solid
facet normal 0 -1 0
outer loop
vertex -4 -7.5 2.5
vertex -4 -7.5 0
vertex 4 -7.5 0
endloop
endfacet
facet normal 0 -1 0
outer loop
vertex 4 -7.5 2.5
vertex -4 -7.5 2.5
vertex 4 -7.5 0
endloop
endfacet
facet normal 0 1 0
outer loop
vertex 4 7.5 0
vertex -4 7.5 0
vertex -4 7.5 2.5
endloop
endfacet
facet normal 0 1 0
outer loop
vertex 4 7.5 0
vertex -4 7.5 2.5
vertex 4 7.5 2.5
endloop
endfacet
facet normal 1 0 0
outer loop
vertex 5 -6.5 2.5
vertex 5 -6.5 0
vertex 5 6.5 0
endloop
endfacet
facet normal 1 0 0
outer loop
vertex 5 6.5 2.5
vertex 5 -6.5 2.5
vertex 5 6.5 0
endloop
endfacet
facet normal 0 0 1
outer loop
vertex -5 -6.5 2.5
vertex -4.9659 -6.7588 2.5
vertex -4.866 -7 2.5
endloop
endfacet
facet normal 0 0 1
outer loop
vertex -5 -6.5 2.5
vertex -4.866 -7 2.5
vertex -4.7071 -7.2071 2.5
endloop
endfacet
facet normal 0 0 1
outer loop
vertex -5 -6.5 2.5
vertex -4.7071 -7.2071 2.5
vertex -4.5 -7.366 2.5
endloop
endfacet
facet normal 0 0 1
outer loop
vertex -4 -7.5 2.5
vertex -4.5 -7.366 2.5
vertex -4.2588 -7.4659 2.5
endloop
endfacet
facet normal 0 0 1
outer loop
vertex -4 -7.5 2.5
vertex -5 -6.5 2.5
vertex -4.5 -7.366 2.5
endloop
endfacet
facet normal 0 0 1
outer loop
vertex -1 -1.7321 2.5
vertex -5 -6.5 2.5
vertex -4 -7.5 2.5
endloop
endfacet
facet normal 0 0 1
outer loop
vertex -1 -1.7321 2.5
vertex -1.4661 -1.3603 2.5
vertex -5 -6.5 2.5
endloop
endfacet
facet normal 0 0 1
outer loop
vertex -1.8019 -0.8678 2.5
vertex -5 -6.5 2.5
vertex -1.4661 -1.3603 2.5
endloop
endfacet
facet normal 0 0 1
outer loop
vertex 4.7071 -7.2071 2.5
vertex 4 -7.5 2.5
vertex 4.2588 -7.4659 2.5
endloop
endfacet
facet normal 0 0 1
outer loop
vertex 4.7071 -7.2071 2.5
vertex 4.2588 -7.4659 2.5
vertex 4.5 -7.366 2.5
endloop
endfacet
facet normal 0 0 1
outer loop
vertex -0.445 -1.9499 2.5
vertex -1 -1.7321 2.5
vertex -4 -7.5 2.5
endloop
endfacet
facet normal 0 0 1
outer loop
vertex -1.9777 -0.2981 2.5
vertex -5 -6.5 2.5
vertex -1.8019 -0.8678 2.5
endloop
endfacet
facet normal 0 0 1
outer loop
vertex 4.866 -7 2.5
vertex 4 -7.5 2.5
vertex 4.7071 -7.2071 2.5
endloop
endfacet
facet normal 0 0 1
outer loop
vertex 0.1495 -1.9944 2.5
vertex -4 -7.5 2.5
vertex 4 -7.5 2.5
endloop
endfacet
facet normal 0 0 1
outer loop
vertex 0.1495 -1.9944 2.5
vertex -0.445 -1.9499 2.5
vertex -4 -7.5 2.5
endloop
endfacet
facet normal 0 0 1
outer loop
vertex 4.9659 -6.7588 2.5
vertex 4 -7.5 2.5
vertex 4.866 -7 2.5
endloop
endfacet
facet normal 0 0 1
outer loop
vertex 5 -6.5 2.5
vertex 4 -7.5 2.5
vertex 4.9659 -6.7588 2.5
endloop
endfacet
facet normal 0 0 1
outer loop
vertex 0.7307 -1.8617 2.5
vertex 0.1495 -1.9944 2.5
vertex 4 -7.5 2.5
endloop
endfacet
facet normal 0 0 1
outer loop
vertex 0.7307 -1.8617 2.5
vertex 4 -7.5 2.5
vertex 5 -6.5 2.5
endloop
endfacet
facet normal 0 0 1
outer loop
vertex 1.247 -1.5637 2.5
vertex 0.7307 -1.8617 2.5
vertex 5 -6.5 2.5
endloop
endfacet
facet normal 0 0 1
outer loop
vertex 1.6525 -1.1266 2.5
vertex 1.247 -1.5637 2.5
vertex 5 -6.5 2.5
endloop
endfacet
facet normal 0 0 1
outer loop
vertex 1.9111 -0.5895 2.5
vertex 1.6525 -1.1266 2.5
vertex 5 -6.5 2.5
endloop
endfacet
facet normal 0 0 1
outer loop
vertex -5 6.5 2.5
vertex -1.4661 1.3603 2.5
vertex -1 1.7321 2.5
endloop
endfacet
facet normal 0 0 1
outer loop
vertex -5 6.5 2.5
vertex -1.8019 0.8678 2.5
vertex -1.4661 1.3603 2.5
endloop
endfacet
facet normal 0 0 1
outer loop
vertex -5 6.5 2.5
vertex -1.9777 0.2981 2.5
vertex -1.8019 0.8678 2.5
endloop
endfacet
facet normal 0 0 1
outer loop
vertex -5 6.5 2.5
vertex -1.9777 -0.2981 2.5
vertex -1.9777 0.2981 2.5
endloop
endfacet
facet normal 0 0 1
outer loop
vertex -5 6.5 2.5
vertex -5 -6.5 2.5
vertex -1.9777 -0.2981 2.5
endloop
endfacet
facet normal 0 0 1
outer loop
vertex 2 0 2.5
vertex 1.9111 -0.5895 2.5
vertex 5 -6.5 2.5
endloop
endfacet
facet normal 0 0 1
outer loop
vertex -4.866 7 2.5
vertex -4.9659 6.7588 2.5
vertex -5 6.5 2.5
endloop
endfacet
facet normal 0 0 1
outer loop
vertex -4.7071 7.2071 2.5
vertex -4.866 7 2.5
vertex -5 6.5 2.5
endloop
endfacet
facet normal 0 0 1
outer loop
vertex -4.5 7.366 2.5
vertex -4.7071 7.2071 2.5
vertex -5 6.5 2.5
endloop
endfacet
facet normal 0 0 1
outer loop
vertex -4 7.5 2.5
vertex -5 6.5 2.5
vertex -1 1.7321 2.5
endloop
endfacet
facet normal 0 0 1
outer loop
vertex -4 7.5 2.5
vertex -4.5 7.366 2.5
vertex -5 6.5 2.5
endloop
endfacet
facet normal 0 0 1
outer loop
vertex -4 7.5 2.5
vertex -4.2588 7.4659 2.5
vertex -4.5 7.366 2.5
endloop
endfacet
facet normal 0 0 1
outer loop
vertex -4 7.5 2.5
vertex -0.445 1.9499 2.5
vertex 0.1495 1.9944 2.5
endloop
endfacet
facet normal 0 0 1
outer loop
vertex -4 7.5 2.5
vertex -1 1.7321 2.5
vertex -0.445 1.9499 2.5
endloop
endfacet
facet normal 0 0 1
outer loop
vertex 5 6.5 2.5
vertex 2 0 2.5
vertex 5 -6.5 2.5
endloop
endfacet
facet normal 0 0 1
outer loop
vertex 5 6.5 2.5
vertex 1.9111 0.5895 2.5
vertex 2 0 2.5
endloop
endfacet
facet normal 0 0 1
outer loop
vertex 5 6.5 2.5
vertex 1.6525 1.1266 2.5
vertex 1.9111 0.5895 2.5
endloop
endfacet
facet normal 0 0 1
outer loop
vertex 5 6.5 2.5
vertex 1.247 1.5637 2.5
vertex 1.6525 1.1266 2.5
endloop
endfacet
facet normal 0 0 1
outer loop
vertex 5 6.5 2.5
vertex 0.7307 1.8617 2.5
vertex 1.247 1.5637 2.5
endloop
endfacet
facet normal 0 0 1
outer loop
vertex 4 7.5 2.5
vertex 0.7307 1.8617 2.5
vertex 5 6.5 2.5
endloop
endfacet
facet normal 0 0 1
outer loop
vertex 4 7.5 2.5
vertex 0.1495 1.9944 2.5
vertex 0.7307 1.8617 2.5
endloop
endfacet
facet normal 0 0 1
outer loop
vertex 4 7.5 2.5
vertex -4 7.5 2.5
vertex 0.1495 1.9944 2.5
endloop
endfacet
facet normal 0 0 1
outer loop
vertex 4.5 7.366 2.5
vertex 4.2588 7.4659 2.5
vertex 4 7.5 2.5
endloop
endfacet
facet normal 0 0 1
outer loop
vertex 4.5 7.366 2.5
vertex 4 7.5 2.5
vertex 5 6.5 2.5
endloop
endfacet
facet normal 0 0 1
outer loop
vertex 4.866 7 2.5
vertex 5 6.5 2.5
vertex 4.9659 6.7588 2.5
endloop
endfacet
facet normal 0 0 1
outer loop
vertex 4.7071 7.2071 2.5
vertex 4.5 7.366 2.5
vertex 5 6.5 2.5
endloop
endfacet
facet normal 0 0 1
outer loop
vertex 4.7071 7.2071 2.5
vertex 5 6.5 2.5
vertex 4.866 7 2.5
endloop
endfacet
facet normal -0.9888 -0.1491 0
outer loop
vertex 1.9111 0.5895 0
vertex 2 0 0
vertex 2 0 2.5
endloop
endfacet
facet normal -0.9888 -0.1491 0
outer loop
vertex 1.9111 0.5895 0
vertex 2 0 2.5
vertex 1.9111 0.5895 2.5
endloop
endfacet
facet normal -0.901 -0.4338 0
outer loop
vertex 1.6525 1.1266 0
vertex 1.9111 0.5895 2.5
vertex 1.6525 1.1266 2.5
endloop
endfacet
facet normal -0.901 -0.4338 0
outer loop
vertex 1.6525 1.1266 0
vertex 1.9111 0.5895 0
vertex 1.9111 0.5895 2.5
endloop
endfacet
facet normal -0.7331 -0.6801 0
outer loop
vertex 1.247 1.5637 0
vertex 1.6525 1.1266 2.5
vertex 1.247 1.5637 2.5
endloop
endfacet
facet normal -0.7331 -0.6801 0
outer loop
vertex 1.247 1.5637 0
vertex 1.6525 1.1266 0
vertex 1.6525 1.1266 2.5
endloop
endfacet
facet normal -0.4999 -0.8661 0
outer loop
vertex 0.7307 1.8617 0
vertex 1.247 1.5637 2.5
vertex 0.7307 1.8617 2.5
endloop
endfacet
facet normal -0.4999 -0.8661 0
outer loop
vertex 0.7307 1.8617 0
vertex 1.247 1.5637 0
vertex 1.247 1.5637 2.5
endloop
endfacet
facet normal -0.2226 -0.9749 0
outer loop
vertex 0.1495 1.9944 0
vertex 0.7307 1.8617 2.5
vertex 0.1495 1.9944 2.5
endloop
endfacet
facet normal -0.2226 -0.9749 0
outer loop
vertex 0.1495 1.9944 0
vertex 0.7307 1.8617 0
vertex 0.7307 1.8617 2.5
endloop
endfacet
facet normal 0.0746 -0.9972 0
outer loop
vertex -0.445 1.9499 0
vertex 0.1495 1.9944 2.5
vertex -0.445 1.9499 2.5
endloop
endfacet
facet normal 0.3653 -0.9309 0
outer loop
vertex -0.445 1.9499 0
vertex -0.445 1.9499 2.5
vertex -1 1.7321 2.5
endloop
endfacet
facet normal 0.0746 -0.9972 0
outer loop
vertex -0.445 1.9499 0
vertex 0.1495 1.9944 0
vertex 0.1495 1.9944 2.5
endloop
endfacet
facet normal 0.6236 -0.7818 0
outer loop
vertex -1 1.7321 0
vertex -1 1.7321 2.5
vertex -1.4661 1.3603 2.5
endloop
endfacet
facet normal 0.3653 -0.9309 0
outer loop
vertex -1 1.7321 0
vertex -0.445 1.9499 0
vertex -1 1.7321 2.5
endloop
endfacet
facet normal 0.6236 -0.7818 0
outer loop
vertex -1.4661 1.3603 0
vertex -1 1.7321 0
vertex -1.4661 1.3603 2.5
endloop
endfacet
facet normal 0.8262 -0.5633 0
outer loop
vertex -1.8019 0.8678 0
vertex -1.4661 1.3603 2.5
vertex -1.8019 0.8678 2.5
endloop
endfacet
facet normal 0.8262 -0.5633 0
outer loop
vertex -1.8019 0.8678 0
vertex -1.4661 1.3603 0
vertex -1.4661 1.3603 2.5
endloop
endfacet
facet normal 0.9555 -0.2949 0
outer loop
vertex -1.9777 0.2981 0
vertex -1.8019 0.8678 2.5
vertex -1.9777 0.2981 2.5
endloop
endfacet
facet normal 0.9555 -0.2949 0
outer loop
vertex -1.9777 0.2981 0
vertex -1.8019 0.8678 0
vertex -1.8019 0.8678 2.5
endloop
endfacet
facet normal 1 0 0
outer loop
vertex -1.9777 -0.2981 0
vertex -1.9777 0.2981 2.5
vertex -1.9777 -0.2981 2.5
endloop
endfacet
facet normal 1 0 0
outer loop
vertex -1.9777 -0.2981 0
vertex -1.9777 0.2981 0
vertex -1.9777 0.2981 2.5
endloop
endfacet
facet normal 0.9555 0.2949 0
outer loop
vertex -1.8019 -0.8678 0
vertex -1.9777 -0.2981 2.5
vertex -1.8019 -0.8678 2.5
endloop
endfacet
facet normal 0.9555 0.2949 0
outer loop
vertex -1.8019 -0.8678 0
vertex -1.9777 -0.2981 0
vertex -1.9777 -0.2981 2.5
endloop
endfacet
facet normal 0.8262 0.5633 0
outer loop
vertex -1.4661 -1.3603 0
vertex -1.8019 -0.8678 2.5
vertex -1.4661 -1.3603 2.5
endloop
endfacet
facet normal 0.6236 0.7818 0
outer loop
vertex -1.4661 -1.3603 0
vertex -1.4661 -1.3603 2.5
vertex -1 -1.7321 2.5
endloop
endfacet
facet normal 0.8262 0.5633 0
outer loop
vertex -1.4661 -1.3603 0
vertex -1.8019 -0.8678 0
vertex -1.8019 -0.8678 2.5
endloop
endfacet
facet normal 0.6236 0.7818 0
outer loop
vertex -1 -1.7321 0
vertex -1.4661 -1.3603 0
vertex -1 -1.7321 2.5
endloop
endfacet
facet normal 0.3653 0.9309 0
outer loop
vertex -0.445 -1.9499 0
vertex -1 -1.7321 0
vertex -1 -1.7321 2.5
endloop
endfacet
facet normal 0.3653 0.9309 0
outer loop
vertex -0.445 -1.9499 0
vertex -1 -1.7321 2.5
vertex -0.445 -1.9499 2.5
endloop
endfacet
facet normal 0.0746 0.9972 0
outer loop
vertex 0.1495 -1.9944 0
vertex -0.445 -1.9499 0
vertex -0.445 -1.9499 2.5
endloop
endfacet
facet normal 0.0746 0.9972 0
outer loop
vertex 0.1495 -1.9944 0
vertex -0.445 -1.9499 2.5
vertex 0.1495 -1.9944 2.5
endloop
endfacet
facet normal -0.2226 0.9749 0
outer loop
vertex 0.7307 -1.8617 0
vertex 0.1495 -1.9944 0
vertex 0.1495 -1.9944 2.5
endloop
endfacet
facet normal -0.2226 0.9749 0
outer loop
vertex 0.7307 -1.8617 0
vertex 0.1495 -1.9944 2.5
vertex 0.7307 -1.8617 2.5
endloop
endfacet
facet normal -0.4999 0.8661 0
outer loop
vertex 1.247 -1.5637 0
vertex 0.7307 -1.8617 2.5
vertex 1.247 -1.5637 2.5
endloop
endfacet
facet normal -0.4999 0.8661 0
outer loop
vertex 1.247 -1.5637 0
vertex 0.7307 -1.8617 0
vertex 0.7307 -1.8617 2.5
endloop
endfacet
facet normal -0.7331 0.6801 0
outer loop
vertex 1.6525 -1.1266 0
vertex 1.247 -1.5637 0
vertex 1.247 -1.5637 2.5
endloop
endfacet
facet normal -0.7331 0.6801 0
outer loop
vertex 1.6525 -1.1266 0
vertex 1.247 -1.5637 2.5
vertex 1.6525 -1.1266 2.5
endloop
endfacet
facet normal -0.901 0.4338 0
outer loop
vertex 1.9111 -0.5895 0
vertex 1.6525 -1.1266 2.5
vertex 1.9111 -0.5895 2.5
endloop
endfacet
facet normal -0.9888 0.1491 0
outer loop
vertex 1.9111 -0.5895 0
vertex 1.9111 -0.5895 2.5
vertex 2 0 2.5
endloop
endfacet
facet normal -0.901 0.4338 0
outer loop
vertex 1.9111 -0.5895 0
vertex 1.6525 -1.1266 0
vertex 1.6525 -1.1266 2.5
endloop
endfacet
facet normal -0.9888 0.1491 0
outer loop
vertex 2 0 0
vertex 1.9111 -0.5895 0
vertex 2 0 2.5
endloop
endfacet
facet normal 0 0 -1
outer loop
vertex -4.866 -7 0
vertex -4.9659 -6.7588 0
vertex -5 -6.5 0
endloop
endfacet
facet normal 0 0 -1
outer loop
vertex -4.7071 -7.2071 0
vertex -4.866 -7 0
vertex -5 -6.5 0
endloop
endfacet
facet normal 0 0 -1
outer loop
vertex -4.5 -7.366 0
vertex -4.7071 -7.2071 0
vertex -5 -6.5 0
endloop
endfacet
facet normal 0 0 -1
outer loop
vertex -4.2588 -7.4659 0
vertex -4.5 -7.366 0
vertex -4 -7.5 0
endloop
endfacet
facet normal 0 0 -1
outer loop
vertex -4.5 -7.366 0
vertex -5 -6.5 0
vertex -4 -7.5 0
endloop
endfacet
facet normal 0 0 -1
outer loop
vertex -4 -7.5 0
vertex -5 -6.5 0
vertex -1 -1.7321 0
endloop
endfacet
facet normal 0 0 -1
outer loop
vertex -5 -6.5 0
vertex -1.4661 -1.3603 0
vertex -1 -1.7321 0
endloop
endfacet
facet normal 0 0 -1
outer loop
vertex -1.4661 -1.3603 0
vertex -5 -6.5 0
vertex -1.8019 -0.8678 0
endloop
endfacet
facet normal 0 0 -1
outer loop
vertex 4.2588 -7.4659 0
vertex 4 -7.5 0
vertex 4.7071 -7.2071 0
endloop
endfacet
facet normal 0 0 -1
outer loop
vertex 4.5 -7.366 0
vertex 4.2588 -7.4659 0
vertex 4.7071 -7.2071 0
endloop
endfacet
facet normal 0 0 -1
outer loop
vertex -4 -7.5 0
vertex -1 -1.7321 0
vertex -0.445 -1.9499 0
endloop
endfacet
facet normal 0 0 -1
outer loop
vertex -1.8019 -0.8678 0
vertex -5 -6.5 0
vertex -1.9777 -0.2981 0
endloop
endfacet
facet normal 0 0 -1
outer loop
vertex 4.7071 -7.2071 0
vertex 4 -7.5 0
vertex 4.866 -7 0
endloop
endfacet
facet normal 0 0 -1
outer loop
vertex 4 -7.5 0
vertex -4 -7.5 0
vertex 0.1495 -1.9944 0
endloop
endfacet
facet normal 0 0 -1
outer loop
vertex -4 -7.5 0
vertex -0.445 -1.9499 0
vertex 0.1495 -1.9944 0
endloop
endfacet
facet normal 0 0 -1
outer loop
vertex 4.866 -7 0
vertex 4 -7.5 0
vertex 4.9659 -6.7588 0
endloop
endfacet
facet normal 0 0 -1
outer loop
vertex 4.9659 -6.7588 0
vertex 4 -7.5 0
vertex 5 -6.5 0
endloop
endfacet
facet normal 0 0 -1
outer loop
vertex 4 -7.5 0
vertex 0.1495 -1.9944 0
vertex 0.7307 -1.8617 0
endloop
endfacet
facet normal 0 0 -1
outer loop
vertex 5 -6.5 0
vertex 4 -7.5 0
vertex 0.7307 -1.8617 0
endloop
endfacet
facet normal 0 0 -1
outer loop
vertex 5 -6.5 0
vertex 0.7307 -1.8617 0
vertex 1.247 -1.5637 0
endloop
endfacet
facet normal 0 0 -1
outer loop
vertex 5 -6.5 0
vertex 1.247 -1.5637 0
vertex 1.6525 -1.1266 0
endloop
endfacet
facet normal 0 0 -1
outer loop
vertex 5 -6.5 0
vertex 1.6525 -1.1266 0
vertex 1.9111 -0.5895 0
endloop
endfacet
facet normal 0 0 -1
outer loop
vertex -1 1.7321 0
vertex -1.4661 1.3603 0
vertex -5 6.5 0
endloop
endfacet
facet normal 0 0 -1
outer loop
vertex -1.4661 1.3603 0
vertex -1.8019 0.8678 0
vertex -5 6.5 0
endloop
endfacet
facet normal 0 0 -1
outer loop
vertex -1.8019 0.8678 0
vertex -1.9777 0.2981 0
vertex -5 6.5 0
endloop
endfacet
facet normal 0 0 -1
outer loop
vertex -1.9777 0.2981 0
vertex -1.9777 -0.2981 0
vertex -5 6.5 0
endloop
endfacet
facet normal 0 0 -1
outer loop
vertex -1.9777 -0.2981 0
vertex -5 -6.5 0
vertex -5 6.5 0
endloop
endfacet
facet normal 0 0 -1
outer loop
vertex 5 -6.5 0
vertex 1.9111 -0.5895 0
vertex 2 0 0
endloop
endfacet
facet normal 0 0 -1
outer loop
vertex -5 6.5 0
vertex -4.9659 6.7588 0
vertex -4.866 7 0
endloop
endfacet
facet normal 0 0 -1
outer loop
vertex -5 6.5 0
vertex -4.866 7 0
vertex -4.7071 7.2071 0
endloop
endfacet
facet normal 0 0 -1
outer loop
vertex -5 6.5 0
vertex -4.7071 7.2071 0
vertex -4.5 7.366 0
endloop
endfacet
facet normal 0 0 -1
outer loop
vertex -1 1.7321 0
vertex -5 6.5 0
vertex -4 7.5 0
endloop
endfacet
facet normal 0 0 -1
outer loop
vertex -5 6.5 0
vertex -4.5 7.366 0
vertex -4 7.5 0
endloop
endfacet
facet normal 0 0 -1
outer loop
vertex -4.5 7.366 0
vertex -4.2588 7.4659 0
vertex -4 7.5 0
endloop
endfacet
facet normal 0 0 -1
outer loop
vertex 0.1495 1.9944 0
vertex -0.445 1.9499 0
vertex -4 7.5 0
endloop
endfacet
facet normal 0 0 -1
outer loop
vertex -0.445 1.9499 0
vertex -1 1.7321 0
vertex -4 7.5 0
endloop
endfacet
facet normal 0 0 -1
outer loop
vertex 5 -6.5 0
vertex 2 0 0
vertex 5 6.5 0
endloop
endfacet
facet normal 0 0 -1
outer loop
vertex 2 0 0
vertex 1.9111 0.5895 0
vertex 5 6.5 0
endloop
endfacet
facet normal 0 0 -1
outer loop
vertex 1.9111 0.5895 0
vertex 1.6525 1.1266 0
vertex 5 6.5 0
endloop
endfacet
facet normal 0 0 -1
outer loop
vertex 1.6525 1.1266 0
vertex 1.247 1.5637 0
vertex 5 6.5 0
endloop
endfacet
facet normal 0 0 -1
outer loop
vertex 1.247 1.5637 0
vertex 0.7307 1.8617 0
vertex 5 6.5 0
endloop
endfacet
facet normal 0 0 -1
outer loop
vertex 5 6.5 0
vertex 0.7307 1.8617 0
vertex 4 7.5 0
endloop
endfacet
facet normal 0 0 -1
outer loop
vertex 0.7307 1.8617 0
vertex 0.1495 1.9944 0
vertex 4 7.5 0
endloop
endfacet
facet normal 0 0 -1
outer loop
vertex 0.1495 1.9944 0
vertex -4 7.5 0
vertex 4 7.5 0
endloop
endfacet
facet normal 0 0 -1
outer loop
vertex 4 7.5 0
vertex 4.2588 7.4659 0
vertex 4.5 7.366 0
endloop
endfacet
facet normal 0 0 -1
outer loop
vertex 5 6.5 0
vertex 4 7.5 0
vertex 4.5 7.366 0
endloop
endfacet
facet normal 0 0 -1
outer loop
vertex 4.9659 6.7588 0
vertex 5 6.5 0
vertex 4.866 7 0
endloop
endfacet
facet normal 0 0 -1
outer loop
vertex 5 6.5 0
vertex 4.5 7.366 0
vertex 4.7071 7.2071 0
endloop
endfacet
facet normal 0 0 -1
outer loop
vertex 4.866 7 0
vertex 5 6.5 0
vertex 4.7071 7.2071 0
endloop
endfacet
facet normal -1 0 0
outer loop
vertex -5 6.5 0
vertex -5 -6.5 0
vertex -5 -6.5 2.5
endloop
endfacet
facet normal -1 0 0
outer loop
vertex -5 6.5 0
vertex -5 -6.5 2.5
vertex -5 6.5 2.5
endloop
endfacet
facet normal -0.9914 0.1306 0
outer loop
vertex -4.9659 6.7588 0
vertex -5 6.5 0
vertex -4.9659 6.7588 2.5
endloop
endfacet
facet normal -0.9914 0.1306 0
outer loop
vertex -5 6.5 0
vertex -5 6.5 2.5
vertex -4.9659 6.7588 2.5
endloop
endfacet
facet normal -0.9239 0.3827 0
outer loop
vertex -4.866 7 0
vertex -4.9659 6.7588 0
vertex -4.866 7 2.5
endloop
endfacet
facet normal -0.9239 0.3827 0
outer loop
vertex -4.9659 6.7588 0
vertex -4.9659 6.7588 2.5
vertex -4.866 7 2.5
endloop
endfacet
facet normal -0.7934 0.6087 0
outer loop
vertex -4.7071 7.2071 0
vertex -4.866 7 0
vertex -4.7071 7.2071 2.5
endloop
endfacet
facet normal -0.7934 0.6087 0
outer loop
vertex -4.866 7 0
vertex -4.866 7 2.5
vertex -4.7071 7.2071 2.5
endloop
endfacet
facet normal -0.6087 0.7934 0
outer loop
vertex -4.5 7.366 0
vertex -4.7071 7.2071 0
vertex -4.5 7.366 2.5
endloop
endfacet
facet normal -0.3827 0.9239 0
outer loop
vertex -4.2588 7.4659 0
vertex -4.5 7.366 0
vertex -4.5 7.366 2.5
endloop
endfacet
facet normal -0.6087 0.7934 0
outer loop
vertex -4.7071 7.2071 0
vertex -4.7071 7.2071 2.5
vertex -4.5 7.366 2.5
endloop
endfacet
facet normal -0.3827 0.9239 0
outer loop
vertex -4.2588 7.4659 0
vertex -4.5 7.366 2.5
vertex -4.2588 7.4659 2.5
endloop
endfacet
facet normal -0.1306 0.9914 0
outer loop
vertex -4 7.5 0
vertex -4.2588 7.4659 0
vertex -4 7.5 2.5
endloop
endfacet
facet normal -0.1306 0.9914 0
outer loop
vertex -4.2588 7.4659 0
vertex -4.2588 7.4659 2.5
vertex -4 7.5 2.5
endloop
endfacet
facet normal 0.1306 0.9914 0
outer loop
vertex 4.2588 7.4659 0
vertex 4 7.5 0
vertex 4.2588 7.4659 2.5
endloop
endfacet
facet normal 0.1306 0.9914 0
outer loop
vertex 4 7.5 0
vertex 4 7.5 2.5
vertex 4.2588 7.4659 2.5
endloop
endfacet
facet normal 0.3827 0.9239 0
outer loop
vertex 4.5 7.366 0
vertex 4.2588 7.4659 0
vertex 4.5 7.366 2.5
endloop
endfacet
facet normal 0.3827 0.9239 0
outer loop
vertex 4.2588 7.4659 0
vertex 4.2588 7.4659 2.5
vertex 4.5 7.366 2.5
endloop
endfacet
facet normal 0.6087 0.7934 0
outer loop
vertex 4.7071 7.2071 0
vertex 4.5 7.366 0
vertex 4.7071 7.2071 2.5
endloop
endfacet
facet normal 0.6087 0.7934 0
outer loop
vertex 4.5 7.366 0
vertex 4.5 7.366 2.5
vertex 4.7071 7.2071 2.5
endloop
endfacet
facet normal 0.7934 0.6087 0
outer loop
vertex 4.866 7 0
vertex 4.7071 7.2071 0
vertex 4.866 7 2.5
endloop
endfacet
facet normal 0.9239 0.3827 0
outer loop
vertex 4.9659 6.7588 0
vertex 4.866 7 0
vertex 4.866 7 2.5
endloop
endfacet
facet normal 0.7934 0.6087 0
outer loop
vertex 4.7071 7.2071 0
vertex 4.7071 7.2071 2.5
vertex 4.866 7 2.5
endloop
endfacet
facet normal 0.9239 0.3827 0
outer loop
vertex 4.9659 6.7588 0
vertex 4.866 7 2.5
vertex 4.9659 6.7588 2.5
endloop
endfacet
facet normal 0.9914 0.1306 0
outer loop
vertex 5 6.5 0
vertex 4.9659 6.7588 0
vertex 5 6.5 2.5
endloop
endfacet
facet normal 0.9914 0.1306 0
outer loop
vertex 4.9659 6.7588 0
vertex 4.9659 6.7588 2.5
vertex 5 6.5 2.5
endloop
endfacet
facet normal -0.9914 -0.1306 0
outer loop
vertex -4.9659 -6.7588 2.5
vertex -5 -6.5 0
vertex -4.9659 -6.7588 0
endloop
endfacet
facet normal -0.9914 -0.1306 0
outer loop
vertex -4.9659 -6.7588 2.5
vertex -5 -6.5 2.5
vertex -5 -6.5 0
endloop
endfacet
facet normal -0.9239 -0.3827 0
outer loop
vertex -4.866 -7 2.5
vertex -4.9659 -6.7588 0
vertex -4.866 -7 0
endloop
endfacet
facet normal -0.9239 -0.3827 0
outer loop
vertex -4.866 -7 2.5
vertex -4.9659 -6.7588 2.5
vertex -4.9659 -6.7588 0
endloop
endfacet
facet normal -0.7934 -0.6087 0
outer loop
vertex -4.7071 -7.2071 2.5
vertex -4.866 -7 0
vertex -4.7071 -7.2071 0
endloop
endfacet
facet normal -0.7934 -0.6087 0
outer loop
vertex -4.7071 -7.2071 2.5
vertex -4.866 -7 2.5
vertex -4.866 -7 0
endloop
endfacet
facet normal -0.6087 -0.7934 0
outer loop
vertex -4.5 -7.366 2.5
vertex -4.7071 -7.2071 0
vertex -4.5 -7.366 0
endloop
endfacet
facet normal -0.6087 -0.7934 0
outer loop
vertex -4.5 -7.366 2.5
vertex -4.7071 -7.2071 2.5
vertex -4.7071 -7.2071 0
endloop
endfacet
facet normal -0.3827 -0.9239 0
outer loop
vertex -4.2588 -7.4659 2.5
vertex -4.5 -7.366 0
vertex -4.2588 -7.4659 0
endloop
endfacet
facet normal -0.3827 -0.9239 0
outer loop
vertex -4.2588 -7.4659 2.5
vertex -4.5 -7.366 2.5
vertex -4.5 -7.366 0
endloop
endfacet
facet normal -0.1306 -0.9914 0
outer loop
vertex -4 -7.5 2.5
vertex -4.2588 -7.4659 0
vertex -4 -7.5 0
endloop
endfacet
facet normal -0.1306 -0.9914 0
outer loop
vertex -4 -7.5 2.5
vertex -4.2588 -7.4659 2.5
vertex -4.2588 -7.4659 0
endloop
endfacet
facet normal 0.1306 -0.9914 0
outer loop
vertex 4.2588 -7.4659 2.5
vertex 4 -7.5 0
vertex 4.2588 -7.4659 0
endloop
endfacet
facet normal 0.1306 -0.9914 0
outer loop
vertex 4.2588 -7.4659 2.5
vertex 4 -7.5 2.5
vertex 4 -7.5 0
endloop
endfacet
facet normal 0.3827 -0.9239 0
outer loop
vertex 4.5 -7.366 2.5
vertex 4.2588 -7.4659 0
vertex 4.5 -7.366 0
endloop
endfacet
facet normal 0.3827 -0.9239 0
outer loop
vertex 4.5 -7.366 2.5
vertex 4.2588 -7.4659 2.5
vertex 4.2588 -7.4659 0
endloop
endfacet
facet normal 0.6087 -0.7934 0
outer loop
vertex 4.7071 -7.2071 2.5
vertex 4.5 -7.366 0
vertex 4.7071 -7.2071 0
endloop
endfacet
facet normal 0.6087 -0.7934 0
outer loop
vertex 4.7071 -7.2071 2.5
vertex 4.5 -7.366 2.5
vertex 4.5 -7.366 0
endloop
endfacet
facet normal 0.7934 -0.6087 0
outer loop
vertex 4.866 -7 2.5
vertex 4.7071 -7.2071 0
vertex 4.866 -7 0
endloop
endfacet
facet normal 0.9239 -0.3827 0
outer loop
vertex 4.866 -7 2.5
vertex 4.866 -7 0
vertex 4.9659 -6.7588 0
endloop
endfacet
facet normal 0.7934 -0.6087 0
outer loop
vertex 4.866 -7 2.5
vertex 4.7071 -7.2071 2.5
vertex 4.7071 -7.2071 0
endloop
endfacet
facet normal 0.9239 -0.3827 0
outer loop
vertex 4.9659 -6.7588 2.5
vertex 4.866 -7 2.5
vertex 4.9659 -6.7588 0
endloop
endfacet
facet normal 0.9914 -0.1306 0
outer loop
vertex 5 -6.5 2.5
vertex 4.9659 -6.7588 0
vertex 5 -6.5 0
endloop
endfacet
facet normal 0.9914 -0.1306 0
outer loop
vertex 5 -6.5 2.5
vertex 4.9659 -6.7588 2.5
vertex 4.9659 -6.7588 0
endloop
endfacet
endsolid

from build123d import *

# Parameters (mm, degrees)
SKETCH_1_W      = 10
SKETCH_1_H      = 15
SKETCH_1_R      = 2
EXTRUDE_1_DEPTH = 2.5
FILLET_1_R      = 1


with BuildPart() as part:
    # ｽｹｯﾁ1 → ﾎﾞｽ - 押し出し1 (new body)
    with BuildSketch(Plane.XY):
        Rectangle(SKETCH_1_W, SKETCH_1_H)
        Circle(SKETCH_1_R, mode=Mode.SUBTRACT)
    extrude(amount=EXTRUDE_1_DEPTH)

    # ﾌｨﾚｯﾄ1
    fillet_1_edges = [part.edges().sort_by_distance(p)[0] for p in [
        (5, -7.5, 1.25),
        (-5, -7.5, 1.25),
        (-5, 7.5, 1.25),
        (5, 7.5, 1.25),
    ]]
    fillet(fillet_1_edges, radius=FILLET_1_R)


solid = part.part
